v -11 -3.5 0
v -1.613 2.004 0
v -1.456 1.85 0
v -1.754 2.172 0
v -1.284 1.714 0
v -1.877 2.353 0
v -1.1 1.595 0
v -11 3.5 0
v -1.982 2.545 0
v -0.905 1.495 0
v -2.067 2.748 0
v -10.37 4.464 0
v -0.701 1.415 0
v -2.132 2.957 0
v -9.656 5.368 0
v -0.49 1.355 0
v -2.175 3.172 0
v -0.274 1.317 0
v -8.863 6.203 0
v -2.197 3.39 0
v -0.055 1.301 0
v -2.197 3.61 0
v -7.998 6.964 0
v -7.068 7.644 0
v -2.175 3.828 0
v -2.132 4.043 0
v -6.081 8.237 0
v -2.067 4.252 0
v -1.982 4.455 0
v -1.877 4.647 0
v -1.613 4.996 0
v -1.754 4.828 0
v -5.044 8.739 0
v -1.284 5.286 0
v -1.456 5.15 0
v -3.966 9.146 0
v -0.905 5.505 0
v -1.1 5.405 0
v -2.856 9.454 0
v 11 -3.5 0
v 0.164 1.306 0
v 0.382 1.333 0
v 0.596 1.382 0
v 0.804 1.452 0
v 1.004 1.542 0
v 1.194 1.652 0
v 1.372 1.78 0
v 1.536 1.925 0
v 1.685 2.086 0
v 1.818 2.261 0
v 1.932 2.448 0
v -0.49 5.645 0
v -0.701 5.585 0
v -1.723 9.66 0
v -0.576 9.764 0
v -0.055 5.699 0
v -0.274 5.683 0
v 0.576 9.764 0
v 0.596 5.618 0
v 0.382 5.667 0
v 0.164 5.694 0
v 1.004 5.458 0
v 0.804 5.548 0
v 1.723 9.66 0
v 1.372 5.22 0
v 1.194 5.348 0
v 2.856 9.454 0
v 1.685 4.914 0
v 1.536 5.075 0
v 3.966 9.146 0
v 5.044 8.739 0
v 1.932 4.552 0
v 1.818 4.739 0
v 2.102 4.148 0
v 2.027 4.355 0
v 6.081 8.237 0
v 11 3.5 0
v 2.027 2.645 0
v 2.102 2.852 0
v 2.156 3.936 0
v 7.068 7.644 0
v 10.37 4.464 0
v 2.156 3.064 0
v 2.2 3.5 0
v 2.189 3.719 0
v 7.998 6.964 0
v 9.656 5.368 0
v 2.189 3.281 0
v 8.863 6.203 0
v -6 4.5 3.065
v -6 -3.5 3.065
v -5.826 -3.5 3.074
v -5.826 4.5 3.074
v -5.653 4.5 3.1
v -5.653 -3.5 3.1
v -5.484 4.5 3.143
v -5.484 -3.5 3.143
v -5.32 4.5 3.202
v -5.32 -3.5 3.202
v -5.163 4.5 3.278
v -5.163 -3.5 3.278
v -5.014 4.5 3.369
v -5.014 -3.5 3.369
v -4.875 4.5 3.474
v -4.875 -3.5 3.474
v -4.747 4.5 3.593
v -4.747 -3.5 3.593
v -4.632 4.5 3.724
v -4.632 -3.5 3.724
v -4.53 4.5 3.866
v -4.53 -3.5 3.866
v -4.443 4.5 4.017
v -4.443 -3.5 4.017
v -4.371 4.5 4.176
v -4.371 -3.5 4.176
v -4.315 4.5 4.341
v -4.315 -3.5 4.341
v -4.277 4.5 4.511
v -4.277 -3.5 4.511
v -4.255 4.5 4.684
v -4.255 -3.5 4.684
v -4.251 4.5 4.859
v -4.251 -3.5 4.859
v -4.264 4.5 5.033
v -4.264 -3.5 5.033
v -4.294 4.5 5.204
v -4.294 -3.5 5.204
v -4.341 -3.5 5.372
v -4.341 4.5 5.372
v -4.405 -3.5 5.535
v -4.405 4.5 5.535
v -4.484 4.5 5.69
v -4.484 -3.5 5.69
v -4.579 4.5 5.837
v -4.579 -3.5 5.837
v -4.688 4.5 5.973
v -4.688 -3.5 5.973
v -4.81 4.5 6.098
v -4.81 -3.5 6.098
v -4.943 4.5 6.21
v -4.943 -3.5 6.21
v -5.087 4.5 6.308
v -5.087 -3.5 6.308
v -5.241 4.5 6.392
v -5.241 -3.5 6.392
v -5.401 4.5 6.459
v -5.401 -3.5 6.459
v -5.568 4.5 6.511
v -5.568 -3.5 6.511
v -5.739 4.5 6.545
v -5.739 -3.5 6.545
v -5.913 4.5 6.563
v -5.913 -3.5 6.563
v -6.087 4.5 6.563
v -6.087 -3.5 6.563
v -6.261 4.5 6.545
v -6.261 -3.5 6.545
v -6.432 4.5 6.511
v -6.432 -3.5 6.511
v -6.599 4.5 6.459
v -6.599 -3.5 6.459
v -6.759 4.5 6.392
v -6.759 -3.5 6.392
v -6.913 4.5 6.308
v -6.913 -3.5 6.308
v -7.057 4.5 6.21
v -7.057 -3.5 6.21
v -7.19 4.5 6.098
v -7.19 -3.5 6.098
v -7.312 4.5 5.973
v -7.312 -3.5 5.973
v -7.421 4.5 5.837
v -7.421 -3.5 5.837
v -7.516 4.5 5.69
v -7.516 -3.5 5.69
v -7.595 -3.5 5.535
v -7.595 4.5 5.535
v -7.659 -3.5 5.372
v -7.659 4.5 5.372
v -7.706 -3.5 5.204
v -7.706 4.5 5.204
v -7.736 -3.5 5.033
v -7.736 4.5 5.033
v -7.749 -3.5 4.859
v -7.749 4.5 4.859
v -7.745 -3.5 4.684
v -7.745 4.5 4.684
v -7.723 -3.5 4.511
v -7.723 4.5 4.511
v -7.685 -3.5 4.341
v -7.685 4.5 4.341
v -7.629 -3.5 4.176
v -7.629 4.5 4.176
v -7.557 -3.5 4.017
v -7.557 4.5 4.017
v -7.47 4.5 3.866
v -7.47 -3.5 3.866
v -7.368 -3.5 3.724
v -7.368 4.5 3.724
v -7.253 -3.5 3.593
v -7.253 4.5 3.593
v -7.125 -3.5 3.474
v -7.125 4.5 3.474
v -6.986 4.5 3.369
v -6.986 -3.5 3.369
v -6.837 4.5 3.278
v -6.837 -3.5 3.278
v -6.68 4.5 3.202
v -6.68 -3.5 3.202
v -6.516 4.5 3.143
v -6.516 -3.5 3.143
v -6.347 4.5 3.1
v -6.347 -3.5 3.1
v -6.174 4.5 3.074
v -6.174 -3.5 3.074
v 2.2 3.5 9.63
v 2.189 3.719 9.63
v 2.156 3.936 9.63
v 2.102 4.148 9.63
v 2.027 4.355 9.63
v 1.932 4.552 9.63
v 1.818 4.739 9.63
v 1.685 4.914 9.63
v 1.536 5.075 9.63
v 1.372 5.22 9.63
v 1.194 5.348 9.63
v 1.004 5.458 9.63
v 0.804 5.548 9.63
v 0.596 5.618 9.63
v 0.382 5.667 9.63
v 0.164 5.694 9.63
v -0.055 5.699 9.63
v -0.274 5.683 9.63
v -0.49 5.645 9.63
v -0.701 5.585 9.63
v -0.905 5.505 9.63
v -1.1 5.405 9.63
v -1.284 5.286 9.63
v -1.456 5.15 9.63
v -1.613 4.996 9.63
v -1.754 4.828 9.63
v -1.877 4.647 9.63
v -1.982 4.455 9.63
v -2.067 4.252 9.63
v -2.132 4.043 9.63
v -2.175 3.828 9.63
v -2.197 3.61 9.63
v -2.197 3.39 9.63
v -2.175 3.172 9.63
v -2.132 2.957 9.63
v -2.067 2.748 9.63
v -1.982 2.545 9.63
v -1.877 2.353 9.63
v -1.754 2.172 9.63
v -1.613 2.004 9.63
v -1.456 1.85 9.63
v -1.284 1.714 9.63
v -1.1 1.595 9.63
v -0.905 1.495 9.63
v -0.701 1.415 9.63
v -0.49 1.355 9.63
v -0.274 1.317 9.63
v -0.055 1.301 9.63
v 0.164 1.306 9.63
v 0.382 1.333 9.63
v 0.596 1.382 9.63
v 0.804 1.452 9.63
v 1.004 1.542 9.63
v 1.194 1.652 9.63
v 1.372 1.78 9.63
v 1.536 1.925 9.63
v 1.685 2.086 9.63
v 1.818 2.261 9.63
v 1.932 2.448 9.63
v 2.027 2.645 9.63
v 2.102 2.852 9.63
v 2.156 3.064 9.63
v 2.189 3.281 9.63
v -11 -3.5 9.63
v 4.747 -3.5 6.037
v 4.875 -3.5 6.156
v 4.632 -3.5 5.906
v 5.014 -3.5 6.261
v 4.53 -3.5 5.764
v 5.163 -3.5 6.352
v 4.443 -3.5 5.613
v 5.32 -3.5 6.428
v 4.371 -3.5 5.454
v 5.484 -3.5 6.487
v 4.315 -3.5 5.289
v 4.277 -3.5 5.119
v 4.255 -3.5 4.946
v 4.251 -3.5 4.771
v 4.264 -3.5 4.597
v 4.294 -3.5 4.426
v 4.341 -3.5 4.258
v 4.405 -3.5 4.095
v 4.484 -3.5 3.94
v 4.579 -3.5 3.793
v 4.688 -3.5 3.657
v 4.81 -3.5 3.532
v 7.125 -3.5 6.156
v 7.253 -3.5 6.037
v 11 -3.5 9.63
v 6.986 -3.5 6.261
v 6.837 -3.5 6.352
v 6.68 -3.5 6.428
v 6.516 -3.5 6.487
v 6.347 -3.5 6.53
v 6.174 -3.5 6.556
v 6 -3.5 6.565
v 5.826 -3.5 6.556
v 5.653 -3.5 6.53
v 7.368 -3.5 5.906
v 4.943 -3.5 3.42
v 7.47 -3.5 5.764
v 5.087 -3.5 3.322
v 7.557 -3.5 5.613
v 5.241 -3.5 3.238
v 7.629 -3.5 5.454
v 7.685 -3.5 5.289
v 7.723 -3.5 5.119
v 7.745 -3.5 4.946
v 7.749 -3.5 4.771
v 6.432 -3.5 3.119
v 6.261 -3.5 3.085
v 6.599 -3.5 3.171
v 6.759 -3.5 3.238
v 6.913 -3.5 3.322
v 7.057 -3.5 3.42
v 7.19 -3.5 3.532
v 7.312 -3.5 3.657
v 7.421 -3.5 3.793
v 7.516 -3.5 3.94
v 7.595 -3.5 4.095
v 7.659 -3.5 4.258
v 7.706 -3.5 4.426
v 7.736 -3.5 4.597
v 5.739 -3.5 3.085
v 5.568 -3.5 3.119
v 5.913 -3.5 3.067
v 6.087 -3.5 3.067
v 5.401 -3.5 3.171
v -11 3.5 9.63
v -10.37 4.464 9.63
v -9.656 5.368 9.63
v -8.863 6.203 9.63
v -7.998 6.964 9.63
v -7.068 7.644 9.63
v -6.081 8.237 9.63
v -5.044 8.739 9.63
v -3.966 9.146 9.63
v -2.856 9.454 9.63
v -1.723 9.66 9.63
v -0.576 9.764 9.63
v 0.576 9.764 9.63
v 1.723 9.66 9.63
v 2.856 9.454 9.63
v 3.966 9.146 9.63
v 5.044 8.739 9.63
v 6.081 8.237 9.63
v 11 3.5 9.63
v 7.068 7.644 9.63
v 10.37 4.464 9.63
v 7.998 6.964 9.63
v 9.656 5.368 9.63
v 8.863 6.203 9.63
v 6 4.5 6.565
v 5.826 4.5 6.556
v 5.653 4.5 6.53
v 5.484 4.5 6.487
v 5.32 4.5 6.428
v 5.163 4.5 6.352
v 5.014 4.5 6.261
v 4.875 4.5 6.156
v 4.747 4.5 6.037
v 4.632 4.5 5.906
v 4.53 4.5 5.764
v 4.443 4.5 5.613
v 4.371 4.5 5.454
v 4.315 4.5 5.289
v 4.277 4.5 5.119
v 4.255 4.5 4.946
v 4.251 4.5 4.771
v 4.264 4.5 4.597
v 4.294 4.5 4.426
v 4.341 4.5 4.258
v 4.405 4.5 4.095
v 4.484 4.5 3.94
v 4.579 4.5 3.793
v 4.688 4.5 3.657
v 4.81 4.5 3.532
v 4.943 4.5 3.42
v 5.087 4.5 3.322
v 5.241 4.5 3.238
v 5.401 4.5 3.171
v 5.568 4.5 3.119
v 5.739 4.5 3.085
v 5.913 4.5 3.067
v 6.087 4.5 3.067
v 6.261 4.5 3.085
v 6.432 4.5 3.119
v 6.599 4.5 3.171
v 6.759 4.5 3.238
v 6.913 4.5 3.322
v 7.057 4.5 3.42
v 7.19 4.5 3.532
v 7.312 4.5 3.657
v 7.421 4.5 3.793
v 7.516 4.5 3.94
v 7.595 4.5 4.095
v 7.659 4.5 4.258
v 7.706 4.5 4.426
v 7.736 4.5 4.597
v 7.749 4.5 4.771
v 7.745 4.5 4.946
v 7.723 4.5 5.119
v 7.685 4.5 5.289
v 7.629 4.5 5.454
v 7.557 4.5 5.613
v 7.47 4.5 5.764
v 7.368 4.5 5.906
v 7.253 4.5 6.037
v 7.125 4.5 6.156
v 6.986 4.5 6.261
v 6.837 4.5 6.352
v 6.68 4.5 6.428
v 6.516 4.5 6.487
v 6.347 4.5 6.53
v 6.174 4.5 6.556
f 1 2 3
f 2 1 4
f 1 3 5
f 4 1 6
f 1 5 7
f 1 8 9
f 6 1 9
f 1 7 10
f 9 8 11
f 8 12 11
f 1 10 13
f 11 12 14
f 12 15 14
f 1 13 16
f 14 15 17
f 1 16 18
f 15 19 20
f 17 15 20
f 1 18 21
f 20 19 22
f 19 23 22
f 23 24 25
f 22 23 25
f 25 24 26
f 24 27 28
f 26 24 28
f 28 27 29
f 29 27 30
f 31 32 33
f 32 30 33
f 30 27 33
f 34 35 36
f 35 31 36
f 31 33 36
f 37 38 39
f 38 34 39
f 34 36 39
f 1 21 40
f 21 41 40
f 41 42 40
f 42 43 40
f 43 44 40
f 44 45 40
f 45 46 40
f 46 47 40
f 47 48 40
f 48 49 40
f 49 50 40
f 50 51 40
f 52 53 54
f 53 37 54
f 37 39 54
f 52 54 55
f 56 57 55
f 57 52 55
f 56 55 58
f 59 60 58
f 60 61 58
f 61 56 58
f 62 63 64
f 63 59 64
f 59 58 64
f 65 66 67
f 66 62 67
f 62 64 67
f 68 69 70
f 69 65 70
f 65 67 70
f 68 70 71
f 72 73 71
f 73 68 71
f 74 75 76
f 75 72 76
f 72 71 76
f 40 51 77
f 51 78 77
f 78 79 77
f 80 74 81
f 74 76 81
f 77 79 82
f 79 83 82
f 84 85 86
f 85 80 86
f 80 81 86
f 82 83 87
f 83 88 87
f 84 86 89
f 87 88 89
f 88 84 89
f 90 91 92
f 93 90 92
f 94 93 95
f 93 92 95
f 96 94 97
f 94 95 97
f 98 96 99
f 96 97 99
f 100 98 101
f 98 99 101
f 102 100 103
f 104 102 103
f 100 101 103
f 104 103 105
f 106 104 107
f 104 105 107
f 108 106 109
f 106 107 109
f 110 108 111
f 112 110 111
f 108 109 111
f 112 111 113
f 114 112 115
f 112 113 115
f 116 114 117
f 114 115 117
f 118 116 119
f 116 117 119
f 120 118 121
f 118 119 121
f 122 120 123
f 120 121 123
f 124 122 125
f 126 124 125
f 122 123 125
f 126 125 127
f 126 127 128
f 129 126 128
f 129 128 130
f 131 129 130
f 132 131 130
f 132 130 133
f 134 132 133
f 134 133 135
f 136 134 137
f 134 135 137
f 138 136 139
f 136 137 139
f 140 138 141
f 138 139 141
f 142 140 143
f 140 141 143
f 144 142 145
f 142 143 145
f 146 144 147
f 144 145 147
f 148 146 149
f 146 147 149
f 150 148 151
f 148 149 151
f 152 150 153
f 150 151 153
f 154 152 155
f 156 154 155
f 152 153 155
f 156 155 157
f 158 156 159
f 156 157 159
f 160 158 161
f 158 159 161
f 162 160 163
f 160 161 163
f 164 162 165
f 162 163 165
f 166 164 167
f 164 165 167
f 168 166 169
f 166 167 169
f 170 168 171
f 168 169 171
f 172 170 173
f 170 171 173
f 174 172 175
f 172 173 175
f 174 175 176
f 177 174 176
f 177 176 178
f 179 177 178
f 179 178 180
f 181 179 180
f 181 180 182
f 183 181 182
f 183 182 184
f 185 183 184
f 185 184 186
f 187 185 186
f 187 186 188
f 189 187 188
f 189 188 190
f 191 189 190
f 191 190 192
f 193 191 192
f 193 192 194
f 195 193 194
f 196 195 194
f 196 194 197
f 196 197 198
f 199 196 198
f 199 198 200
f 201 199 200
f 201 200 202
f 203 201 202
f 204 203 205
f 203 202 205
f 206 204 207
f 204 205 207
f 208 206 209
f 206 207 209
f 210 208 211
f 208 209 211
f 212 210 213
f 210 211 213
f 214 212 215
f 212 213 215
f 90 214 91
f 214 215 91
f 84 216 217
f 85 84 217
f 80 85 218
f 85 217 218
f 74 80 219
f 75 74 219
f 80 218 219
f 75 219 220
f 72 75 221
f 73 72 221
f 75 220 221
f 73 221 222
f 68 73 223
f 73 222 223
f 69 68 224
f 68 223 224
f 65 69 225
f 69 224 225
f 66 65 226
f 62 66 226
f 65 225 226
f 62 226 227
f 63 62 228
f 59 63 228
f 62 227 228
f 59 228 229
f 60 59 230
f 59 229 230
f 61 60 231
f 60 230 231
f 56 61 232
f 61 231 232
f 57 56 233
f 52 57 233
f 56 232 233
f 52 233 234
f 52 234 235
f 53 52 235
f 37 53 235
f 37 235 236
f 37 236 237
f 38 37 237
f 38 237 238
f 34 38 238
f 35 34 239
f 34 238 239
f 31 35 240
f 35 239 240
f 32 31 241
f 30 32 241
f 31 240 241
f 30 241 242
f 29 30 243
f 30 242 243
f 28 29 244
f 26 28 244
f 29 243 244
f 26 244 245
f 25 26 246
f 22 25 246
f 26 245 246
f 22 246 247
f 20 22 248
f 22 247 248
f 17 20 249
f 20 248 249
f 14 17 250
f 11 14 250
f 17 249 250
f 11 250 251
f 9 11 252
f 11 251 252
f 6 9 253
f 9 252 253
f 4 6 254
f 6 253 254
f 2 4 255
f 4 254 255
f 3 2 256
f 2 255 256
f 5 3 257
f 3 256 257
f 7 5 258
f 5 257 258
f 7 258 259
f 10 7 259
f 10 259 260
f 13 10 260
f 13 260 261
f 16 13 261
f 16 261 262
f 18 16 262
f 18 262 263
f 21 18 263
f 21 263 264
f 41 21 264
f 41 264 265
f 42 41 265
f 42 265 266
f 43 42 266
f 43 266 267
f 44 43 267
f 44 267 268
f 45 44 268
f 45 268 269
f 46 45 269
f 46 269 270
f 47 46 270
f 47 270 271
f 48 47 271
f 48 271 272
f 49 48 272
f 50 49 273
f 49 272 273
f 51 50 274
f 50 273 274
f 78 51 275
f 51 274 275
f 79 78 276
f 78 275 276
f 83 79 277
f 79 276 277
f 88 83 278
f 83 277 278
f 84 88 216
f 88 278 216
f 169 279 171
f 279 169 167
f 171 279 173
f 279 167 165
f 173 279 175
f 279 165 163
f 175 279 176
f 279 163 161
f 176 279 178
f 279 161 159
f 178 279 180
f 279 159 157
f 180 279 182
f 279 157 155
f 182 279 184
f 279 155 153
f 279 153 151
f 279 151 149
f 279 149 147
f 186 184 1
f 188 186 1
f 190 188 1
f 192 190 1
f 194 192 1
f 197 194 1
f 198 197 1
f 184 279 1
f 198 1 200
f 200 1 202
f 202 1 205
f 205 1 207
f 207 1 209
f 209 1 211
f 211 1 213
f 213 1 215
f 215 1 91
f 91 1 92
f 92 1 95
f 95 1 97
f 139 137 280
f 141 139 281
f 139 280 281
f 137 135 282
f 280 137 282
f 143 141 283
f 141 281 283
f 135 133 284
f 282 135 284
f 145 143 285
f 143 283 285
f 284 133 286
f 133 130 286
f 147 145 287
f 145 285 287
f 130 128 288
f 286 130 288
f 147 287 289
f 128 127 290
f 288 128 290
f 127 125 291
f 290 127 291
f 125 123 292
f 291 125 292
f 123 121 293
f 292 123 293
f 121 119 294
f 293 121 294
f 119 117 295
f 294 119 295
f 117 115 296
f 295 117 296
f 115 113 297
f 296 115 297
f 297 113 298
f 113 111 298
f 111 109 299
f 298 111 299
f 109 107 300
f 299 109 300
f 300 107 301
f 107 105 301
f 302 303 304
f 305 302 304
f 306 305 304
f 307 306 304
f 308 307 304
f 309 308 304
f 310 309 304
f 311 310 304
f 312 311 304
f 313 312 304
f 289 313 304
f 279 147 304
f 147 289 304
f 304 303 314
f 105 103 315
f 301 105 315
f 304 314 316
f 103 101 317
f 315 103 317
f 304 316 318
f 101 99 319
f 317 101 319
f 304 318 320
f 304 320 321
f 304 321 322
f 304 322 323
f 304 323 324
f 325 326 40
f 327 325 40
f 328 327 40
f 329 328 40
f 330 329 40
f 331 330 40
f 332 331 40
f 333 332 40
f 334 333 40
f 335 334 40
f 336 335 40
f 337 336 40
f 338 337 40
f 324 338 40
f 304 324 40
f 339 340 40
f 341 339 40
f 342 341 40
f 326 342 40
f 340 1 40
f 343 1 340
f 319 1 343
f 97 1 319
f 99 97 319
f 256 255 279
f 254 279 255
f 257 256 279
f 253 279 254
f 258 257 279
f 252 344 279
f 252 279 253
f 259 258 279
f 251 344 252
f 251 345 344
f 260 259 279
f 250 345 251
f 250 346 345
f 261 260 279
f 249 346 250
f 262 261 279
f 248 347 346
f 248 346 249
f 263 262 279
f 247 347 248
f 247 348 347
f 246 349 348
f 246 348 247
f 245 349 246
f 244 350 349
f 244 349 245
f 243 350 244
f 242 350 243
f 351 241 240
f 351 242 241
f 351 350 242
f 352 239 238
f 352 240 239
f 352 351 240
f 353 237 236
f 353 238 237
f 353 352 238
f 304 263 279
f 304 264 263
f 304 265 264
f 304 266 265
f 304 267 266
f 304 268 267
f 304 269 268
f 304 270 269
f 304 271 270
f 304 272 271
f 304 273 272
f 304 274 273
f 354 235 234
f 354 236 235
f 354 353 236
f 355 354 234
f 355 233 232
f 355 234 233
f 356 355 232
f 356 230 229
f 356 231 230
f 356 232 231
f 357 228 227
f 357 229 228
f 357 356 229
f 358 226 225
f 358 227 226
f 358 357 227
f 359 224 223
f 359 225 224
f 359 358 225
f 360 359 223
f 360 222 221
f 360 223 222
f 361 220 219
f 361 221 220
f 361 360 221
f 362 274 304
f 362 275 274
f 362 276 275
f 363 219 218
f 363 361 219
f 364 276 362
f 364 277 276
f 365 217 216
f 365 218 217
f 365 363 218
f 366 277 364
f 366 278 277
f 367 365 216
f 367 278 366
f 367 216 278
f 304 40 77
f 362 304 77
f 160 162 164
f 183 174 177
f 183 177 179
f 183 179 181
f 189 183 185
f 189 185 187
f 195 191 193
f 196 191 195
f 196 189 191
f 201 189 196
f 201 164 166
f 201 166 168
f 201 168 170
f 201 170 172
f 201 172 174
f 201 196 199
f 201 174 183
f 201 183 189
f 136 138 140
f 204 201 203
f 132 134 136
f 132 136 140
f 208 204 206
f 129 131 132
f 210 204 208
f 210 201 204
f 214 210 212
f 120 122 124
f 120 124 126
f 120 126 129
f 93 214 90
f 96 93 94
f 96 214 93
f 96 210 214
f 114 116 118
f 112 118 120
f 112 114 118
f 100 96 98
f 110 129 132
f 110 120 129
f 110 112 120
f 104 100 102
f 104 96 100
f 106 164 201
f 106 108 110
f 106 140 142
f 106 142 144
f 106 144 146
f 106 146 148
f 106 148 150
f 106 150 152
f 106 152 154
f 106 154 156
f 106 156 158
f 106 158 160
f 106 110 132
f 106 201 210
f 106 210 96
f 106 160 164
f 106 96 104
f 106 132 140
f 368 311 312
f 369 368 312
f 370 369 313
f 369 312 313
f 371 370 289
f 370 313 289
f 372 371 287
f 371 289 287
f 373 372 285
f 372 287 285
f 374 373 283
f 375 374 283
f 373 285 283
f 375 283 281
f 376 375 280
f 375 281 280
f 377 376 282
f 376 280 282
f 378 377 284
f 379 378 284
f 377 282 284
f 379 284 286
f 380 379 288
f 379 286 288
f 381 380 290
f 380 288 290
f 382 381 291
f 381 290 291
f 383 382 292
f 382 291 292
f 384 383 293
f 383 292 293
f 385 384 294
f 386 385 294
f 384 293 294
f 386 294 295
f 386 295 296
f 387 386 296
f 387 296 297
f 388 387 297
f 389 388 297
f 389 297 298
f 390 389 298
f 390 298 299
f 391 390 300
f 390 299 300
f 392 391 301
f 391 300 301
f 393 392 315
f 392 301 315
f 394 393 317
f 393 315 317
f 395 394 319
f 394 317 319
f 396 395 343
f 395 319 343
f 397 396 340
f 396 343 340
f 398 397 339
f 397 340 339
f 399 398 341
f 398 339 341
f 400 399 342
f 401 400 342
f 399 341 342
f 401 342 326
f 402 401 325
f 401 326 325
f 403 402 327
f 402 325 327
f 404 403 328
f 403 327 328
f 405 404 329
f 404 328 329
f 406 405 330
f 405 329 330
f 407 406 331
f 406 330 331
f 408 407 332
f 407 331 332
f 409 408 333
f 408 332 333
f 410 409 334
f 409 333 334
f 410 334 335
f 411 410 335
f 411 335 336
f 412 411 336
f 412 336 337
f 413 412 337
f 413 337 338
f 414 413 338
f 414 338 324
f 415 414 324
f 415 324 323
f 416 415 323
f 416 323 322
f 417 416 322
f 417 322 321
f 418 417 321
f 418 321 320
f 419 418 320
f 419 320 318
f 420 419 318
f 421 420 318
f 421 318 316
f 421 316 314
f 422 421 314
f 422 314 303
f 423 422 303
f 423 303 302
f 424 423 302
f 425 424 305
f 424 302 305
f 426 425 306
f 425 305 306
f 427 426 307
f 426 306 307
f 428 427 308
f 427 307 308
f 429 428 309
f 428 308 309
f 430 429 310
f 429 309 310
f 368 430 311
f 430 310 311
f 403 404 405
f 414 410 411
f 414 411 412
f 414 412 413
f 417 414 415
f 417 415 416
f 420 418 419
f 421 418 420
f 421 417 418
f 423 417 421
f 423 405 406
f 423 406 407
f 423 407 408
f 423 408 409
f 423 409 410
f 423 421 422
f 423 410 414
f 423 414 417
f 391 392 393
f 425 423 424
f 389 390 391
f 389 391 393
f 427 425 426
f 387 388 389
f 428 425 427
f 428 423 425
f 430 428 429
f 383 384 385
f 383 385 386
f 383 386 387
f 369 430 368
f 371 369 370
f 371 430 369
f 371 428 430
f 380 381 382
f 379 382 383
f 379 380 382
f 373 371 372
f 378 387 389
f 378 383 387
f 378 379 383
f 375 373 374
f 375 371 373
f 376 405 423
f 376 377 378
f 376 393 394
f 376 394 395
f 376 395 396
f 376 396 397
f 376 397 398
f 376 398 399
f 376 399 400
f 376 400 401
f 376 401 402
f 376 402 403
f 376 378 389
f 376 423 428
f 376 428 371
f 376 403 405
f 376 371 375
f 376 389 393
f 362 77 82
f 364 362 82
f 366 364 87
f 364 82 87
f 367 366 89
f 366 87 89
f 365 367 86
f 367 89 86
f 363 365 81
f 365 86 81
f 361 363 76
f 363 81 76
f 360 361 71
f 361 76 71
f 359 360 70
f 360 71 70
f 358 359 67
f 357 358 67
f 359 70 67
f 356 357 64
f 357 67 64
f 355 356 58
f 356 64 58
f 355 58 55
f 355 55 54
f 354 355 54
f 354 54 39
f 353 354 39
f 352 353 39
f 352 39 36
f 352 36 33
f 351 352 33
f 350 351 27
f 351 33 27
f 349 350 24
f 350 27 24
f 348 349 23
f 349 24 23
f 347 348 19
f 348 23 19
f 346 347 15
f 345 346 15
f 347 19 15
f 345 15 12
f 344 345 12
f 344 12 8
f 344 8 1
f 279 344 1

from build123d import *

# Parameters (mm, degrees)
EXTRUDE_3_8_DEPTH = 9.63
SKETCH2_R         = 2.2
M5_DRILL_DEPTH    = 9.63
SKETCH3_R         = 1.75
M4_DRILL_DEPTH    = 8


with BuildPart() as part:
    # Sketch1 → 3/8 (new body)
    with BuildSketch(Plane.XY):
        with BuildLine():
            Line((-11, 3.5), (-11, -3.5))
            Line((-11, -3.5), (11, -3.5))
            Line((11, -3.5), (11, 3.5))
            ThreePointArc((11, 3.5), (0, 9.776932339), (-11, 3.5))
        make_face()
    extrude(amount=EXTRUDE_3_8_DEPTH)

    # Sketch2 → M5_DRILL (cut)
    with BuildSketch(Plane.XY.offset(9.63)):
        with Locations((0, 3.5)):
            Circle(SKETCH2_R)
    extrude(amount=-M5_DRILL_DEPTH, mode=Mode.SUBTRACT)

    # Sketch3 → M4_DRILL (cut)
    with BuildSketch(Plane.XZ.offset(3.5)):
        with Locations(Location((-6, 4.815, 0), (0, 0, 270))):
            Circle(SKETCH3_R)
        with Locations(Location((6, 4.815, 0), (0, 0, 90))):
            Circle(SKETCH3_R)
    extrude(amount=-M4_DRILL_DEPTH, mode=Mode.SUBTRACT)


solid = part.part
